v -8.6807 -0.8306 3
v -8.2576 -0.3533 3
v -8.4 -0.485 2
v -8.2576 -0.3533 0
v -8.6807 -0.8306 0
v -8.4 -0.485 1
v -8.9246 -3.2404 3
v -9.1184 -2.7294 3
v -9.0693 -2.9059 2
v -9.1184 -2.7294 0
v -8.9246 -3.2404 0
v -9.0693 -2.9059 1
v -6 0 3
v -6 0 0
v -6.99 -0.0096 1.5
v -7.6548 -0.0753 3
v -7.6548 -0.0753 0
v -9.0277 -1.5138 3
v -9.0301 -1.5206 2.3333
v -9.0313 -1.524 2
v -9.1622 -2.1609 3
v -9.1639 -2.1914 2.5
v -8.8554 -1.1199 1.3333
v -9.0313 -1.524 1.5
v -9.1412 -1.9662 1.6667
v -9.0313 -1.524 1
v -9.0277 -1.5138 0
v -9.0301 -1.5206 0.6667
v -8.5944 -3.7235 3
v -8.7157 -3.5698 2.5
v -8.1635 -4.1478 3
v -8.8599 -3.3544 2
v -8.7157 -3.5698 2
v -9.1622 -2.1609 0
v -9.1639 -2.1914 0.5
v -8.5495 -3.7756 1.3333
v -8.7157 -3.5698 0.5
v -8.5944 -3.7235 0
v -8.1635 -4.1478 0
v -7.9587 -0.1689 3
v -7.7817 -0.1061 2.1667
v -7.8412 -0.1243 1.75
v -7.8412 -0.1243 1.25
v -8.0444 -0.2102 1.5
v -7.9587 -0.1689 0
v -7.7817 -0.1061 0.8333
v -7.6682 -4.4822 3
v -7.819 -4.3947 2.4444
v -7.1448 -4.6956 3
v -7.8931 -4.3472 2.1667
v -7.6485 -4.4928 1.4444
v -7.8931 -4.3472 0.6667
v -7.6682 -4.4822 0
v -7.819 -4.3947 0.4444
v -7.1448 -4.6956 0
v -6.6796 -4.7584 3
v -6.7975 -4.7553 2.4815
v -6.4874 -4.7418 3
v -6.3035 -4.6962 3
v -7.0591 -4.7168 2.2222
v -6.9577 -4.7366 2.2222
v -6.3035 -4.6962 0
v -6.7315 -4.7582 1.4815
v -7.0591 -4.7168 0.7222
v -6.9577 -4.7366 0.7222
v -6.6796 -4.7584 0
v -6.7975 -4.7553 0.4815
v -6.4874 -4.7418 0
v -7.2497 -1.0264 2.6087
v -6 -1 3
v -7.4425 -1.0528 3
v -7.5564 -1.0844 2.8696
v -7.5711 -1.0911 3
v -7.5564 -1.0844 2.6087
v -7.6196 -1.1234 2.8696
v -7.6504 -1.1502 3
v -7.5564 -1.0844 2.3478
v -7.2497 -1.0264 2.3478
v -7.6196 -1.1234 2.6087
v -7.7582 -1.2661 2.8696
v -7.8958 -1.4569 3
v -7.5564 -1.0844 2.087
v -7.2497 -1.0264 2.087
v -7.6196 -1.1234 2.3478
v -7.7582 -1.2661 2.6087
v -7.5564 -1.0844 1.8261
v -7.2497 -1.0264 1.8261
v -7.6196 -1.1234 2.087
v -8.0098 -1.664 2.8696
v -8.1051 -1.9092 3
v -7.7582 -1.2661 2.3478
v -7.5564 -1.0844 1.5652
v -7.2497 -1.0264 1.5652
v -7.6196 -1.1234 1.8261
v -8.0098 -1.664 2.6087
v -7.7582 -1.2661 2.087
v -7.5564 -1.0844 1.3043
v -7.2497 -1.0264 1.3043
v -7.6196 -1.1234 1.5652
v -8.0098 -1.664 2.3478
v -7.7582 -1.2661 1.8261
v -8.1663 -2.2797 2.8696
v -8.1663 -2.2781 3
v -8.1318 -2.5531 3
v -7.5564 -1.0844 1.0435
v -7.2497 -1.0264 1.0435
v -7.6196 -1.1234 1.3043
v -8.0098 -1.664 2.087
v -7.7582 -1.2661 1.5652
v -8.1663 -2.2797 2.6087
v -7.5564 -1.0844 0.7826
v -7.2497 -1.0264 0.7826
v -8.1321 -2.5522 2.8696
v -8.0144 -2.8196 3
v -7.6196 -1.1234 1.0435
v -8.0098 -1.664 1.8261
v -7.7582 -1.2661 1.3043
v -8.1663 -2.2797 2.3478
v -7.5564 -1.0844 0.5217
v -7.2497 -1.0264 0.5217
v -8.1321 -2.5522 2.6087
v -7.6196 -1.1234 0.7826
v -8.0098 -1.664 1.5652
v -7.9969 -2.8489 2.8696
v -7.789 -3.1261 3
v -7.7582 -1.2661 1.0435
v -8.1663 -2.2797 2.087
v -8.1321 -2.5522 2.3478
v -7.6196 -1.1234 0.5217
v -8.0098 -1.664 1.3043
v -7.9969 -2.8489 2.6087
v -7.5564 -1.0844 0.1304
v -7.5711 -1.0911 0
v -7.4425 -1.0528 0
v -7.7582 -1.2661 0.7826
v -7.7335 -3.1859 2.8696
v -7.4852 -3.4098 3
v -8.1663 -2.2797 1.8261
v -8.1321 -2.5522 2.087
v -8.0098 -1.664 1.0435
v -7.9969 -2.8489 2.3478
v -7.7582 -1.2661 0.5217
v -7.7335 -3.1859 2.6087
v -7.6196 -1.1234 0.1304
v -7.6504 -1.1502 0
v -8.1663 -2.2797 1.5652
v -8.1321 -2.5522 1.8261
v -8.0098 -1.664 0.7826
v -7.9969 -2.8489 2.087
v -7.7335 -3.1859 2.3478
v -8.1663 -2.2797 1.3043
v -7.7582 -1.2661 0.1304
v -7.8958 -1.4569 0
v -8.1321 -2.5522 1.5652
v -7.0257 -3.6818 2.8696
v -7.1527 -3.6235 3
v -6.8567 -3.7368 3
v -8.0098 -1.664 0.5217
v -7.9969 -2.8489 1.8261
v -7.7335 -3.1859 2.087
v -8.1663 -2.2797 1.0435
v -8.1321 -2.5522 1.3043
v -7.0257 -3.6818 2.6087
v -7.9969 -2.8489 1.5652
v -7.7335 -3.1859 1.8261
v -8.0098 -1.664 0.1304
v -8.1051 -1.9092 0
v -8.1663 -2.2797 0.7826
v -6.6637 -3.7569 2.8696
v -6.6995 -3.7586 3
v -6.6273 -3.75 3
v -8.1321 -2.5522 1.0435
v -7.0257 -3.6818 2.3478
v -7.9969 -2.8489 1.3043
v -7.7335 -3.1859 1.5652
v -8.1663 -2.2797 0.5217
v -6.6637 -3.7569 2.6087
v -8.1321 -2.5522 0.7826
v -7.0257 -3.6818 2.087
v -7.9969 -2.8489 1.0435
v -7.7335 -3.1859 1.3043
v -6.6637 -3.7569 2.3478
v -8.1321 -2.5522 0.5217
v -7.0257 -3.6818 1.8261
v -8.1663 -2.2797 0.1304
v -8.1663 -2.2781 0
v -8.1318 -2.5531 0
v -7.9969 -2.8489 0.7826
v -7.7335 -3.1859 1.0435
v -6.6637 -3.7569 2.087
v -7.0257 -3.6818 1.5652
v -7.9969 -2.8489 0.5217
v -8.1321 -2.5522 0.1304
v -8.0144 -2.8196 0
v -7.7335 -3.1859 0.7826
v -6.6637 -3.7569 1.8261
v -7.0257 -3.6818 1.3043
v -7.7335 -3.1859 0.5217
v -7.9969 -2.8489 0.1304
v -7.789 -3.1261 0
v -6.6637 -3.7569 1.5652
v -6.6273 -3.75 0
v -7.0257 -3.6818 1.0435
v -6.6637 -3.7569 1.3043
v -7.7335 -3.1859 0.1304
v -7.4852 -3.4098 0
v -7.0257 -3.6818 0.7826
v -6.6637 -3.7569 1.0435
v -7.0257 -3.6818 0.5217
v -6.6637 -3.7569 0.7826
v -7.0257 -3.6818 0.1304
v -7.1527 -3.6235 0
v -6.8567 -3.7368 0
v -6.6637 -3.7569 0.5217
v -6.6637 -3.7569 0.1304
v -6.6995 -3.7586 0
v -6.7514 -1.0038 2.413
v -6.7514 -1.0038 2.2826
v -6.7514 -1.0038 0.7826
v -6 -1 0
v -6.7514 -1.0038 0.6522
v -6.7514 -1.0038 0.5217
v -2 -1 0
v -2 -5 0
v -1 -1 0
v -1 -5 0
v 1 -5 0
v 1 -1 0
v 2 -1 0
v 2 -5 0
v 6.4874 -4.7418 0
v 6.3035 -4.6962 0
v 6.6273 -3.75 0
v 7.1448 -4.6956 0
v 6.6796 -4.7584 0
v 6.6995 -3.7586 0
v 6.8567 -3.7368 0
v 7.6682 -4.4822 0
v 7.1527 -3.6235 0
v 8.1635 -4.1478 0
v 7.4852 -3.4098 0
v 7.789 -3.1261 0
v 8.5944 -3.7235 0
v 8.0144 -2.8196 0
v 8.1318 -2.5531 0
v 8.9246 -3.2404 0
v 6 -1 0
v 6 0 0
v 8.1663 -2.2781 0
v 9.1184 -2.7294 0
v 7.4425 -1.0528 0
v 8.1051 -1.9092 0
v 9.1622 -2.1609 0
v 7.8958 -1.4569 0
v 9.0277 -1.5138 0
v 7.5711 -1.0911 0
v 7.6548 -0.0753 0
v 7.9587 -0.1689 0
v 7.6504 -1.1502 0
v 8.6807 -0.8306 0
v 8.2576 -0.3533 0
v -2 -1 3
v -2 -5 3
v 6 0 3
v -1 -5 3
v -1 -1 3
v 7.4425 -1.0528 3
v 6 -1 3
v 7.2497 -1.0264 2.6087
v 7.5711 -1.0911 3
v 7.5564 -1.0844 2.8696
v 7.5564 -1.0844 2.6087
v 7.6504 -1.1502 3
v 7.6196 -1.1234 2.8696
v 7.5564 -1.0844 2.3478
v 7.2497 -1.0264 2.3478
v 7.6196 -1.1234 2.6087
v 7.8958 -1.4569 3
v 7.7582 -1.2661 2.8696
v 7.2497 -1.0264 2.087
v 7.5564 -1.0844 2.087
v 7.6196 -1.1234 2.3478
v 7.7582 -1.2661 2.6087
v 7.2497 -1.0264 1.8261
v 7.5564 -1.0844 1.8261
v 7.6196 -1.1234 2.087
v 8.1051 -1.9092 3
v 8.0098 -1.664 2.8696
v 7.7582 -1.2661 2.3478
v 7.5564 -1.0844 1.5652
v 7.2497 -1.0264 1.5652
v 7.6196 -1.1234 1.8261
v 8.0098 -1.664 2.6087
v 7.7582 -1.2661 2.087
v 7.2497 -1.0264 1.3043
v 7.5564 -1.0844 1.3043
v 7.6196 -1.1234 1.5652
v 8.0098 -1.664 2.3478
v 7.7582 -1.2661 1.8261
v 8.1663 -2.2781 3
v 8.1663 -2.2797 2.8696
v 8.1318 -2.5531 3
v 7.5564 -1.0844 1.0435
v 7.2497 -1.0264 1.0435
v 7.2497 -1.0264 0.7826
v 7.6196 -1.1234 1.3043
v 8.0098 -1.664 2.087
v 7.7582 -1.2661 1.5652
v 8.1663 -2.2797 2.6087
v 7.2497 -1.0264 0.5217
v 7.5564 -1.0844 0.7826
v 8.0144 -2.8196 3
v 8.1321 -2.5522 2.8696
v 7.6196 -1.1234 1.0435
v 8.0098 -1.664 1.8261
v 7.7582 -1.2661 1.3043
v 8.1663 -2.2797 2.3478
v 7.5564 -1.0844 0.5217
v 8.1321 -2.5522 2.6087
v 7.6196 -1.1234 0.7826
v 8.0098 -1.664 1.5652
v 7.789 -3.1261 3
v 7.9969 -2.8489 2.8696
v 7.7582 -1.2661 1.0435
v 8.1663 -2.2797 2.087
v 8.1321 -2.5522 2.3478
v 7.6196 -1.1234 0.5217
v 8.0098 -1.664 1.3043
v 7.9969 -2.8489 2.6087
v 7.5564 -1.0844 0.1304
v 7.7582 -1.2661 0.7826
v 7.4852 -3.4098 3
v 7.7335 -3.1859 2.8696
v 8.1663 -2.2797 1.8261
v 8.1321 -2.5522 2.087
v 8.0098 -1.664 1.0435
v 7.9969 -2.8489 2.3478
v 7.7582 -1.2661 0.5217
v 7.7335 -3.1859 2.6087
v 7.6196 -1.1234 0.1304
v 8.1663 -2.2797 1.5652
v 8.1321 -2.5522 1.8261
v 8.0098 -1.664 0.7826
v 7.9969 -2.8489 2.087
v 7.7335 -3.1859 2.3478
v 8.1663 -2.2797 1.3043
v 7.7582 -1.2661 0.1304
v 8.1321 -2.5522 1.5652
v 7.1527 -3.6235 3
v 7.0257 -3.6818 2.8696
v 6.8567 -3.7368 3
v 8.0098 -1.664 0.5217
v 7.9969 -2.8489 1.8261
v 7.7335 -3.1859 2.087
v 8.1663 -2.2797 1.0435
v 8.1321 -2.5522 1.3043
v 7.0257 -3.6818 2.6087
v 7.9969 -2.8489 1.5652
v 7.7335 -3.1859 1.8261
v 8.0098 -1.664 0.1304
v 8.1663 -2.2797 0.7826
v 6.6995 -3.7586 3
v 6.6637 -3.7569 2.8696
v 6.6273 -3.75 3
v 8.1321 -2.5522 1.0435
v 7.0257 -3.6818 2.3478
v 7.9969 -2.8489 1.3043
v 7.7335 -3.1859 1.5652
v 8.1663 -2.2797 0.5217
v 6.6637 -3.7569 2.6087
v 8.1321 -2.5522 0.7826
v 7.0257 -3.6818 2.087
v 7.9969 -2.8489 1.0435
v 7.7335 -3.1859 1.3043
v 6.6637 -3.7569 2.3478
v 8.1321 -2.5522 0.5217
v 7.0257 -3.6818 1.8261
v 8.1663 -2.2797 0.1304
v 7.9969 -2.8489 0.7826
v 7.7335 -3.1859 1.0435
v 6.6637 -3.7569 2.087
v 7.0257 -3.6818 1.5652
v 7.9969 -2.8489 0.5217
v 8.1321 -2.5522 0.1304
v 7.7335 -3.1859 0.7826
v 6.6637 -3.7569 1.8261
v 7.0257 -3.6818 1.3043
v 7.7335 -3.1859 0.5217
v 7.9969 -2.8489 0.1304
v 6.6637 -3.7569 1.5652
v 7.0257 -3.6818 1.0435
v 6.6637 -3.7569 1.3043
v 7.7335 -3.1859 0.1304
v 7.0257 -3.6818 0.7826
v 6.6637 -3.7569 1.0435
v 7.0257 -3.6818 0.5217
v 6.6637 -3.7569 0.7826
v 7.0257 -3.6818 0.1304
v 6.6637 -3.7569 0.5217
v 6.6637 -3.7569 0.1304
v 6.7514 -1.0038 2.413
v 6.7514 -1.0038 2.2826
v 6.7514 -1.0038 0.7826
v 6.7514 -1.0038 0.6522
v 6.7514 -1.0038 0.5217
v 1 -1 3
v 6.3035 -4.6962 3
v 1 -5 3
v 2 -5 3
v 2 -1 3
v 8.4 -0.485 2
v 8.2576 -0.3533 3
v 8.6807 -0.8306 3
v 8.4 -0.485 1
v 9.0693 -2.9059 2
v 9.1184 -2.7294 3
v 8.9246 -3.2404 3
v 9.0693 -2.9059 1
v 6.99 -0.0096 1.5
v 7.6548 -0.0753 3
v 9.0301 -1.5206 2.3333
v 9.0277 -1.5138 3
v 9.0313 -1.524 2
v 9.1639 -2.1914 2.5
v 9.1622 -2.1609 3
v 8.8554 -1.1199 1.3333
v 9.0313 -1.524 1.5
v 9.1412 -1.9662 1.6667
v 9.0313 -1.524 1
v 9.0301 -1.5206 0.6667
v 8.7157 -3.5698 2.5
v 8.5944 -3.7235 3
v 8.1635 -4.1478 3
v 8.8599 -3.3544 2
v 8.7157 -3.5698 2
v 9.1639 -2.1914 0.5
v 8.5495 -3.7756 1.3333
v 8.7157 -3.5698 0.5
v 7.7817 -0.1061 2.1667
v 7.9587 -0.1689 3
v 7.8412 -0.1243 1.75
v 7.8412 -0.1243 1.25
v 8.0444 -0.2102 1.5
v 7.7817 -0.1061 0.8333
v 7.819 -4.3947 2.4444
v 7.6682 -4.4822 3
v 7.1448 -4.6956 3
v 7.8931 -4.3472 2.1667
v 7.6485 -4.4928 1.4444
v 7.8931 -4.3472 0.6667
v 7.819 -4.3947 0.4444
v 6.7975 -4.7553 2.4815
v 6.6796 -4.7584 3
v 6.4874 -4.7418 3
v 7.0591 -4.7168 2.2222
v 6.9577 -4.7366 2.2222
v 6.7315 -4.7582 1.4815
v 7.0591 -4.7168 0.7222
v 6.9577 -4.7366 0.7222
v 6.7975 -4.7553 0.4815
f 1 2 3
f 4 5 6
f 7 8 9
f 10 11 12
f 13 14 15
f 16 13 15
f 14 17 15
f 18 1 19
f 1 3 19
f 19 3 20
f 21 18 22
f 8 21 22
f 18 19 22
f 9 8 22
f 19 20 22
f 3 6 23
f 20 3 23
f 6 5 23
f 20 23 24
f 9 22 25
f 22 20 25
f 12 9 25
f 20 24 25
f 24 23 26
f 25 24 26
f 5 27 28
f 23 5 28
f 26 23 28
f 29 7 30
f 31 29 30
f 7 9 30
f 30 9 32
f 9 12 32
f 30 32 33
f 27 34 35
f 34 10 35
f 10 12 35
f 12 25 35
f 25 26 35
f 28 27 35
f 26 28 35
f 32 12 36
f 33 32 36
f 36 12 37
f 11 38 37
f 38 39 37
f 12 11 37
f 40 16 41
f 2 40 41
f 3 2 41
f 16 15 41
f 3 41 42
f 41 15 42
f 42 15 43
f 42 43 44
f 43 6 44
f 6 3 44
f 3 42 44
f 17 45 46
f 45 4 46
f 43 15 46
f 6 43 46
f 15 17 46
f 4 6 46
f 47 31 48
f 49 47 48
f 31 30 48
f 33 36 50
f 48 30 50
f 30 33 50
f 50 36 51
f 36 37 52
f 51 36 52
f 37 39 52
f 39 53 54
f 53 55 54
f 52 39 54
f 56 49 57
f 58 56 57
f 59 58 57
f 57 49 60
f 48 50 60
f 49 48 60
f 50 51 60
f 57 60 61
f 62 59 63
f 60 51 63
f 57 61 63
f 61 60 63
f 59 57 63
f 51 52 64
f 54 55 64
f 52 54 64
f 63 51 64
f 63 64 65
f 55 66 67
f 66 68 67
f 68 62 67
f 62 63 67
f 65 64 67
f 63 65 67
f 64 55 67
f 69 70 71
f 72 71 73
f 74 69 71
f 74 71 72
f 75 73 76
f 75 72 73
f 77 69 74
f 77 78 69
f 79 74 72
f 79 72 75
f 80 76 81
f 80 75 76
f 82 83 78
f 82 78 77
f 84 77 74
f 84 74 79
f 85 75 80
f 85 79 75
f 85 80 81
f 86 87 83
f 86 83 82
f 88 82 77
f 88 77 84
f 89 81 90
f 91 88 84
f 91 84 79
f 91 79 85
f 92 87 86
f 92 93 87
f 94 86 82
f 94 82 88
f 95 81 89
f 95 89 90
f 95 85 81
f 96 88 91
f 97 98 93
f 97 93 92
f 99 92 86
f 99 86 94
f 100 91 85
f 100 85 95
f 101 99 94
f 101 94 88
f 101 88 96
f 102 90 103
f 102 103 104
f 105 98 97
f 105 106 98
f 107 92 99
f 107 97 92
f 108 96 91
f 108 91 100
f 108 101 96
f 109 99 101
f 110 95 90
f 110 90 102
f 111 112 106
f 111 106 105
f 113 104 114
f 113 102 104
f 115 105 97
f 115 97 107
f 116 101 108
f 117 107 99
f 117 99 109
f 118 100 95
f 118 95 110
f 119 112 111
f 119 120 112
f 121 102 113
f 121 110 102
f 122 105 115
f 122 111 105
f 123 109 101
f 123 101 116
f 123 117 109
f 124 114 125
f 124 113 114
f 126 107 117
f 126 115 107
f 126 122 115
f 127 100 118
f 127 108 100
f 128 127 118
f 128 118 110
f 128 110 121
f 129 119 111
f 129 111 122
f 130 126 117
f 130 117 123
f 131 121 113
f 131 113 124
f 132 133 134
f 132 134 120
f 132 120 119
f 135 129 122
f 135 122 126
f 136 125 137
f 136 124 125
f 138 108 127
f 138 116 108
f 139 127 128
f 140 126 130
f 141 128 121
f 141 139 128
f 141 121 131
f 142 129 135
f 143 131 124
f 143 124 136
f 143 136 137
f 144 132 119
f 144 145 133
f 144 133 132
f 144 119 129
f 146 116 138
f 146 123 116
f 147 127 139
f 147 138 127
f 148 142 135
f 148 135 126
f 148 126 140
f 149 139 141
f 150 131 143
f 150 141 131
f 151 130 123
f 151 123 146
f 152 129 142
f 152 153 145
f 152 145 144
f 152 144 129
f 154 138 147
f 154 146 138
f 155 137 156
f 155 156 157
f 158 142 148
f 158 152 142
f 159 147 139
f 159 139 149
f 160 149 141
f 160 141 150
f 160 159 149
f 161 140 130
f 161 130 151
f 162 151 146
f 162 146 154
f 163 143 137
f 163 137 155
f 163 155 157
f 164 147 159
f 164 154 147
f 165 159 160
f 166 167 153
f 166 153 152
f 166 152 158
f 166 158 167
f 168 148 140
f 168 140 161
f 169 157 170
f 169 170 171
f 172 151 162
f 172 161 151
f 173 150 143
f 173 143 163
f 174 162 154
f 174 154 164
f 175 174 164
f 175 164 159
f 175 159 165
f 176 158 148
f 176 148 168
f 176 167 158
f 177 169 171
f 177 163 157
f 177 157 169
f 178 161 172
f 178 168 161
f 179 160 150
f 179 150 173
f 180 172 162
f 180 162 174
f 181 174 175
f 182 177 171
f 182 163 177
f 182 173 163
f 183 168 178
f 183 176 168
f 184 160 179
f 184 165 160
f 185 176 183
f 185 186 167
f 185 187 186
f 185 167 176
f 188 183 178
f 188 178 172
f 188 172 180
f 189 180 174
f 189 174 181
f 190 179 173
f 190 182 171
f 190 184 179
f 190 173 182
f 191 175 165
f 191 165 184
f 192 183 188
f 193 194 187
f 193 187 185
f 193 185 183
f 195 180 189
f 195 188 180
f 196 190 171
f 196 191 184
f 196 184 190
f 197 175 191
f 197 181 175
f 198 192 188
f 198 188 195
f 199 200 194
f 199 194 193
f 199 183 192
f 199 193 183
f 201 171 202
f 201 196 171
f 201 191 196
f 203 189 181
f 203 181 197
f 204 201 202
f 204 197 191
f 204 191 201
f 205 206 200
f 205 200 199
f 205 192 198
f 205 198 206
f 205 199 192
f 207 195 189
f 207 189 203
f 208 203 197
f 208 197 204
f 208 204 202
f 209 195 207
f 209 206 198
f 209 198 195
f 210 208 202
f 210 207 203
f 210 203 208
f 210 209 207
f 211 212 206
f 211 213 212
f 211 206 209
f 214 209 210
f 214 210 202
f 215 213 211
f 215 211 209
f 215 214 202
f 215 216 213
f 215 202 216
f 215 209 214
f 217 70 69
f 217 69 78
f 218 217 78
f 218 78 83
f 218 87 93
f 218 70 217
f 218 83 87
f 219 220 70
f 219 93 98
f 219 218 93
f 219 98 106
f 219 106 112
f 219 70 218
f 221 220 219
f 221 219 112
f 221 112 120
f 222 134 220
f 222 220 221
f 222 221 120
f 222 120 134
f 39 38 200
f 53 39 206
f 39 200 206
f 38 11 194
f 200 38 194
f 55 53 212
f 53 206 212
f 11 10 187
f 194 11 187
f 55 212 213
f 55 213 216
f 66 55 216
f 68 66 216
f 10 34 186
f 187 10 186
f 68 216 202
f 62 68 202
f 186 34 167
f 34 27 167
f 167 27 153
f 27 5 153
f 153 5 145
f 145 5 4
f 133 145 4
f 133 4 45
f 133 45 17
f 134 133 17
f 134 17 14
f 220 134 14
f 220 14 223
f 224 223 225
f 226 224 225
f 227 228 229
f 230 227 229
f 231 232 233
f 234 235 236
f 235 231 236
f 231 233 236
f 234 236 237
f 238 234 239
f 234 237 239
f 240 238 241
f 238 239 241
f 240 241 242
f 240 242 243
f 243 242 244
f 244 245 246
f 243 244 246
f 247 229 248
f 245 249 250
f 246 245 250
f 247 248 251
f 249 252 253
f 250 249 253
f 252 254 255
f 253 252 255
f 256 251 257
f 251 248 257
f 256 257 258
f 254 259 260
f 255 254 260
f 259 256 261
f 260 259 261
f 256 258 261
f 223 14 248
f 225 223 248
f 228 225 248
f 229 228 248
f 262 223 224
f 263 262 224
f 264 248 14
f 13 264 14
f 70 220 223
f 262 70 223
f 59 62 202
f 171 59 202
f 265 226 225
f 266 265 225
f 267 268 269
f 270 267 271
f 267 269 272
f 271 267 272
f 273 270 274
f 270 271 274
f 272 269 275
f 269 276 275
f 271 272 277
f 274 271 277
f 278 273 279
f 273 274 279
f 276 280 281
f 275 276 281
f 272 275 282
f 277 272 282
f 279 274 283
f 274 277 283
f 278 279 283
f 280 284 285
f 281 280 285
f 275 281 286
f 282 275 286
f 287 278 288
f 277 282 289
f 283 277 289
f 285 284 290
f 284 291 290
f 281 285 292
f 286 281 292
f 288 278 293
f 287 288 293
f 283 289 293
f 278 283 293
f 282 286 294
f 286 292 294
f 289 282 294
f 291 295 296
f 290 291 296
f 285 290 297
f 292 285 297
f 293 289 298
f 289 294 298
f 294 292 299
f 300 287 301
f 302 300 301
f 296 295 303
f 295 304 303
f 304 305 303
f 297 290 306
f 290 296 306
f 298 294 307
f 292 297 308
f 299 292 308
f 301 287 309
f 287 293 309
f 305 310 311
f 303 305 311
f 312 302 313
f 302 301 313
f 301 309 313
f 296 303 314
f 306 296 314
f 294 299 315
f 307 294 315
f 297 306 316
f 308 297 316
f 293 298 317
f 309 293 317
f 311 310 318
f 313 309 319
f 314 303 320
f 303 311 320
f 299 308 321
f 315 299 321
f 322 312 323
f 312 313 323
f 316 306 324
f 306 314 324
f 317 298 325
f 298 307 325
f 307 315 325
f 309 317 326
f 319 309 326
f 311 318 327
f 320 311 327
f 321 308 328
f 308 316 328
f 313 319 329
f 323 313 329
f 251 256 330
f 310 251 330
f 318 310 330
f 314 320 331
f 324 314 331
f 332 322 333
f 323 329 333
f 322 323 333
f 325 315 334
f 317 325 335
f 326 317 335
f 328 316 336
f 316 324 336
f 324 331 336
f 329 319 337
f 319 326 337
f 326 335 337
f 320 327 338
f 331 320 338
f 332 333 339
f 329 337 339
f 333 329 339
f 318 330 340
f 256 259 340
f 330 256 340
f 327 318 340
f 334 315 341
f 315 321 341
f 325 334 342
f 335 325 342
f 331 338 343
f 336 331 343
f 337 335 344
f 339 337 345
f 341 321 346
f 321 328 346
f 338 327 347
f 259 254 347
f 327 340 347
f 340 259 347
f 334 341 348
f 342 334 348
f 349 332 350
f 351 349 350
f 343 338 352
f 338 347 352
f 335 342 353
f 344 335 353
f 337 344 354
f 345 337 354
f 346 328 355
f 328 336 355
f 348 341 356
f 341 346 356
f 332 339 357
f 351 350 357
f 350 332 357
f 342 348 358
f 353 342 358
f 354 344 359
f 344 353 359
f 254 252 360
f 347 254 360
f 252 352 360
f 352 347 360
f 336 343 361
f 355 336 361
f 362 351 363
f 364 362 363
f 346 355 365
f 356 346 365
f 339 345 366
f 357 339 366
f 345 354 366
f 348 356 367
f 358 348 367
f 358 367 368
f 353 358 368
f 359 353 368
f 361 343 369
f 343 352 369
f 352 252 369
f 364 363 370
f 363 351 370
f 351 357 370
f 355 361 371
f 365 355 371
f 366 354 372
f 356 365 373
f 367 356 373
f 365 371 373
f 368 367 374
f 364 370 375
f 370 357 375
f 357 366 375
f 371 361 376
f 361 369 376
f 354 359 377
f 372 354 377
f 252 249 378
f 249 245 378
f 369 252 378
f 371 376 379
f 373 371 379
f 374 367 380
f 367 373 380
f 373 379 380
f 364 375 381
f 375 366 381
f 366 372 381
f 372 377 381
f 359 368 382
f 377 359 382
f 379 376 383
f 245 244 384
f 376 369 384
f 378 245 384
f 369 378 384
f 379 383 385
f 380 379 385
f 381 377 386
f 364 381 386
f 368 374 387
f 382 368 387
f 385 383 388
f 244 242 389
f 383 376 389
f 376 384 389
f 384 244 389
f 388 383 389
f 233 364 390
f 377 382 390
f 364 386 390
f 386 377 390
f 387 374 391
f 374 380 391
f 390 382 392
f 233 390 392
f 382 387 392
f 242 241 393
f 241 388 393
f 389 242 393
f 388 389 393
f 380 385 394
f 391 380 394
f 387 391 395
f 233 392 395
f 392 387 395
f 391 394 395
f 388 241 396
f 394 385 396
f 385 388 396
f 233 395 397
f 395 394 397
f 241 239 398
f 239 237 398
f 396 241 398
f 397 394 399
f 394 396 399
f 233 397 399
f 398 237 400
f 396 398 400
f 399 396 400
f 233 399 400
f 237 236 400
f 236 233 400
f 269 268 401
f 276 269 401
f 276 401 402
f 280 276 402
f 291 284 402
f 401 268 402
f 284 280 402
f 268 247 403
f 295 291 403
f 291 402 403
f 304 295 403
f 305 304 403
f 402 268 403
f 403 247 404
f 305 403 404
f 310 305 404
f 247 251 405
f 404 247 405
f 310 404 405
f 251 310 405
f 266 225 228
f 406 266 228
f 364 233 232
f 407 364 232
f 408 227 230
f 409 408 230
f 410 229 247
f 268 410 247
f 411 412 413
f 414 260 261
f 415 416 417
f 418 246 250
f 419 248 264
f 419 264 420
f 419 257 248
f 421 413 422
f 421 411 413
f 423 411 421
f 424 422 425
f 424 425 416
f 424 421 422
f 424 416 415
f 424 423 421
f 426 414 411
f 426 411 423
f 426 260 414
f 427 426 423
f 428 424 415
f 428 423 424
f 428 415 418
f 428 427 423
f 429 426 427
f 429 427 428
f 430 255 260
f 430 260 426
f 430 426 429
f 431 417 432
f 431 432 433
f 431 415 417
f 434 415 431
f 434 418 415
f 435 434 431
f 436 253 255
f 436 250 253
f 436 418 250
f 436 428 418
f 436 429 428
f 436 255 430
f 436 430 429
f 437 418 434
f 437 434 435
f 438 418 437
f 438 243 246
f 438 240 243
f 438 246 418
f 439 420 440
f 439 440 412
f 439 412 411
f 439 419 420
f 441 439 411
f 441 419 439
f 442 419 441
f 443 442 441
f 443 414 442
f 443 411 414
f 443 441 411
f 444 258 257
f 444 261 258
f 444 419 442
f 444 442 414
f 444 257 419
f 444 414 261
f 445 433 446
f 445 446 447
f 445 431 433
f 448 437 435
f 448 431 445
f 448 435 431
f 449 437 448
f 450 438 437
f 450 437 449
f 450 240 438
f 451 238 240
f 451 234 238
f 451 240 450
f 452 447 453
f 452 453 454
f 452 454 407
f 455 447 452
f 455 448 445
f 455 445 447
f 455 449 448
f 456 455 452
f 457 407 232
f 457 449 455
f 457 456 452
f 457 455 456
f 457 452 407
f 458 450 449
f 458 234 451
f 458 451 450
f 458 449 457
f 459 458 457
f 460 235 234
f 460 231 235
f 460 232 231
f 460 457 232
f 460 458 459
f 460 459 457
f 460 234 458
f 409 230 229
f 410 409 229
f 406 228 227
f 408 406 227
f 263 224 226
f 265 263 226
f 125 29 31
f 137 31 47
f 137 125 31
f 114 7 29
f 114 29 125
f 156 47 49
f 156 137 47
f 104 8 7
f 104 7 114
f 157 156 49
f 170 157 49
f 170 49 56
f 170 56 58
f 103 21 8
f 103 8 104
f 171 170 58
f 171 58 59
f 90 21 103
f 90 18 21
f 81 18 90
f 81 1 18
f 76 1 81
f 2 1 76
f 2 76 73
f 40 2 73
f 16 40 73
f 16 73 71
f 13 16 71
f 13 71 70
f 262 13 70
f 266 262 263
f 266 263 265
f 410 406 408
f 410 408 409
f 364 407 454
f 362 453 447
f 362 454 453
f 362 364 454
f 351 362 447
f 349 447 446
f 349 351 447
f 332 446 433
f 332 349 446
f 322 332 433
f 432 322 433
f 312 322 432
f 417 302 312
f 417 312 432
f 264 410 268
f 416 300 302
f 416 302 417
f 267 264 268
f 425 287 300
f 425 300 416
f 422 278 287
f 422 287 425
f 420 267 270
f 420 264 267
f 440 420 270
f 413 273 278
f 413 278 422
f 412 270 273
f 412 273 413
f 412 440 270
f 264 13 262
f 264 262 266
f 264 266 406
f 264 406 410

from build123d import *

# Parameters (mm, degrees)
F0_W     = 1
F0_H     = 1
F1_DEPTH = 3


# Not quite as in the source:
# - ends of sketch curves that miss each other by under 0.0002 mm in the source are joined
# - the dataset's text gives a spline's control points without its knots; the knots are read off the source's solid


with BuildPart() as f1:
    # F0 (on Top) → F1 (new body)
    with BuildSketch(Plane.XY):
        with Locations((0.5, -0.5)):
            Rectangle(F0_W, F0_H)
        with Locations((-0.5, -0.5)):
            Rectangle(F0_W, F0_H)
        Polygon((2, 0), (1, 0), (1, -1), (1, -5), (2, -5), (2, -1), align=None)
        Polygon((-1, -1), (-1, 0), (-2, 0), (-2, -1), (-2, -5), (-1, -5), align=None)
        with BuildLine():
            Line((6, 0), (2, 0))
            Line((2, 0), (2, -1))
            Line((2, -1), (6, -1))
            add(Edge.make_bspline(
                [(6, -1), (6.2943328716, -1), (6.7928790283, -1.0001284078), (7.2918933464, -1.0221779319), (7.4969615527, -1.0616895732), (7.56024585, -1.085258147), (7.5844634078, -1.0978186915), (7.6150443946, -1.1182344461), (7.6731849802, -1.1697526134), (7.7575411055, -1.2621427239), (7.8755473485, -1.4166571253), (8.0187330203, -1.659050071), (8.1368085957, -1.9798232644), (8.1720854573, -2.2348468695), (8.1618492839, -2.4205343228), (8.1357439574, -2.551784525), (8.0876272471, -2.6853118112), (8.0024166775, -2.8475491469), (7.8841123581, -3.0179740605), (7.6881815621, -3.2443388545), (7.3889123533, -3.5000214004), (7.0125685263, -3.7045676762), (6.7646613516, -3.7611825156), (6.6590556256, -3.7581499322), (6.6348866575, -3.7523734664), (6.6273172151, -3.7500032276)],
                knots=[0, 0, 0, 0, 0.0625, 0.125, 0.1875, 0.21875, 0.25, 0.28125, 0.3125, 0.34375, 0.375, 0.4375, 0.5, 0.5625, 0.59375, 0.625, 0.65625, 0.6875, 0.71875, 0.75, 0.8125, 0.875, 0.9375, 0.96875, 0.9966456355, 0.9966456355, 0.9966456355, 0.9966456355], degree=3))
            Line((6.6273172151, -3.7500032276), (6.3035145558, -4.6961655705))
            add(Edge.make_bspline(
                [(6, 0), (7.4849501429, 0), (8.3781624755, -0.0030244964), (9.961931742, -3.0861209791), (7.2766393676, -5.0262618498), (6.3035145558, -4.6961655705)],
                knots=[0, 0, 0, 0, 0.3151779178, 0.6343970778, 1, 1, 1, 1], degree=3))
        make_face()
        with BuildLine():
            Line((-2, -1), (-2, 0))
            Line((-2, 0), (-6, 0))
            add(Edge.make_bspline(
                [(-6, 0), (-7.4849501429, 0), (-8.3781624755, -0.0030244964), (-9.961931742, -3.0861209791), (-7.2766393676, -5.0262618498), (-6.3035145558, -4.6961655705)],
                knots=[0, 0, 0, 0, 0.3151779178, 0.6343970778, 1, 1, 1, 1], degree=3))
            Line((-6.3035145558, -4.6961655705), (-6.6273182258, -3.75))
            add(Edge.make_bspline(
                [(-6, -1), (-6.2943328716, -1), (-6.7928790283, -1.0001284078), (-7.2918933464, -1.0221779319), (-7.4969615527, -1.0616895732), (-7.56024585, -1.085258147), (-7.5844634078, -1.0978186915), (-7.6150443946, -1.1182344461), (-7.6731849802, -1.1697526134), (-7.7575411055, -1.2621427239), (-7.8755473485, -1.4166571253), (-8.0187330203, -1.659050071), (-8.1368085957, -1.9798232644), (-8.1720854573, -2.2348468695), (-8.1618492839, -2.4205343228), (-8.1357439574, -2.551784525), (-8.0876272471, -2.6853118112), (-8.0024166775, -2.8475491469), (-7.8841123581, -3.0179740605), (-7.6881815621, -3.2443388545), (-7.3889123533, -3.5000214004), (-7.0125685263, -3.7045676762), (-6.7646613516, -3.7611825156), (-6.6590556256, -3.7581499322), (-6.6348866575, -3.7523734664), (-6.6273182258, -3.75)],
                knots=[0, 0, 0, 0, 0.0625, 0.125, 0.1875, 0.21875, 0.25, 0.28125, 0.3125, 0.34375, 0.375, 0.4375, 0.5, 0.5625, 0.59375, 0.625, 0.65625, 0.6875, 0.71875, 0.75, 0.8125, 0.875, 0.9375, 0.96875, 0.9966456355, 0.9966456355, 0.9966456355, 0.9966456355], degree=3))
            Line((-6, -1), (-2, -1))
        make_face()
    extrude(amount=F1_DEPTH)


solid = f1.part
